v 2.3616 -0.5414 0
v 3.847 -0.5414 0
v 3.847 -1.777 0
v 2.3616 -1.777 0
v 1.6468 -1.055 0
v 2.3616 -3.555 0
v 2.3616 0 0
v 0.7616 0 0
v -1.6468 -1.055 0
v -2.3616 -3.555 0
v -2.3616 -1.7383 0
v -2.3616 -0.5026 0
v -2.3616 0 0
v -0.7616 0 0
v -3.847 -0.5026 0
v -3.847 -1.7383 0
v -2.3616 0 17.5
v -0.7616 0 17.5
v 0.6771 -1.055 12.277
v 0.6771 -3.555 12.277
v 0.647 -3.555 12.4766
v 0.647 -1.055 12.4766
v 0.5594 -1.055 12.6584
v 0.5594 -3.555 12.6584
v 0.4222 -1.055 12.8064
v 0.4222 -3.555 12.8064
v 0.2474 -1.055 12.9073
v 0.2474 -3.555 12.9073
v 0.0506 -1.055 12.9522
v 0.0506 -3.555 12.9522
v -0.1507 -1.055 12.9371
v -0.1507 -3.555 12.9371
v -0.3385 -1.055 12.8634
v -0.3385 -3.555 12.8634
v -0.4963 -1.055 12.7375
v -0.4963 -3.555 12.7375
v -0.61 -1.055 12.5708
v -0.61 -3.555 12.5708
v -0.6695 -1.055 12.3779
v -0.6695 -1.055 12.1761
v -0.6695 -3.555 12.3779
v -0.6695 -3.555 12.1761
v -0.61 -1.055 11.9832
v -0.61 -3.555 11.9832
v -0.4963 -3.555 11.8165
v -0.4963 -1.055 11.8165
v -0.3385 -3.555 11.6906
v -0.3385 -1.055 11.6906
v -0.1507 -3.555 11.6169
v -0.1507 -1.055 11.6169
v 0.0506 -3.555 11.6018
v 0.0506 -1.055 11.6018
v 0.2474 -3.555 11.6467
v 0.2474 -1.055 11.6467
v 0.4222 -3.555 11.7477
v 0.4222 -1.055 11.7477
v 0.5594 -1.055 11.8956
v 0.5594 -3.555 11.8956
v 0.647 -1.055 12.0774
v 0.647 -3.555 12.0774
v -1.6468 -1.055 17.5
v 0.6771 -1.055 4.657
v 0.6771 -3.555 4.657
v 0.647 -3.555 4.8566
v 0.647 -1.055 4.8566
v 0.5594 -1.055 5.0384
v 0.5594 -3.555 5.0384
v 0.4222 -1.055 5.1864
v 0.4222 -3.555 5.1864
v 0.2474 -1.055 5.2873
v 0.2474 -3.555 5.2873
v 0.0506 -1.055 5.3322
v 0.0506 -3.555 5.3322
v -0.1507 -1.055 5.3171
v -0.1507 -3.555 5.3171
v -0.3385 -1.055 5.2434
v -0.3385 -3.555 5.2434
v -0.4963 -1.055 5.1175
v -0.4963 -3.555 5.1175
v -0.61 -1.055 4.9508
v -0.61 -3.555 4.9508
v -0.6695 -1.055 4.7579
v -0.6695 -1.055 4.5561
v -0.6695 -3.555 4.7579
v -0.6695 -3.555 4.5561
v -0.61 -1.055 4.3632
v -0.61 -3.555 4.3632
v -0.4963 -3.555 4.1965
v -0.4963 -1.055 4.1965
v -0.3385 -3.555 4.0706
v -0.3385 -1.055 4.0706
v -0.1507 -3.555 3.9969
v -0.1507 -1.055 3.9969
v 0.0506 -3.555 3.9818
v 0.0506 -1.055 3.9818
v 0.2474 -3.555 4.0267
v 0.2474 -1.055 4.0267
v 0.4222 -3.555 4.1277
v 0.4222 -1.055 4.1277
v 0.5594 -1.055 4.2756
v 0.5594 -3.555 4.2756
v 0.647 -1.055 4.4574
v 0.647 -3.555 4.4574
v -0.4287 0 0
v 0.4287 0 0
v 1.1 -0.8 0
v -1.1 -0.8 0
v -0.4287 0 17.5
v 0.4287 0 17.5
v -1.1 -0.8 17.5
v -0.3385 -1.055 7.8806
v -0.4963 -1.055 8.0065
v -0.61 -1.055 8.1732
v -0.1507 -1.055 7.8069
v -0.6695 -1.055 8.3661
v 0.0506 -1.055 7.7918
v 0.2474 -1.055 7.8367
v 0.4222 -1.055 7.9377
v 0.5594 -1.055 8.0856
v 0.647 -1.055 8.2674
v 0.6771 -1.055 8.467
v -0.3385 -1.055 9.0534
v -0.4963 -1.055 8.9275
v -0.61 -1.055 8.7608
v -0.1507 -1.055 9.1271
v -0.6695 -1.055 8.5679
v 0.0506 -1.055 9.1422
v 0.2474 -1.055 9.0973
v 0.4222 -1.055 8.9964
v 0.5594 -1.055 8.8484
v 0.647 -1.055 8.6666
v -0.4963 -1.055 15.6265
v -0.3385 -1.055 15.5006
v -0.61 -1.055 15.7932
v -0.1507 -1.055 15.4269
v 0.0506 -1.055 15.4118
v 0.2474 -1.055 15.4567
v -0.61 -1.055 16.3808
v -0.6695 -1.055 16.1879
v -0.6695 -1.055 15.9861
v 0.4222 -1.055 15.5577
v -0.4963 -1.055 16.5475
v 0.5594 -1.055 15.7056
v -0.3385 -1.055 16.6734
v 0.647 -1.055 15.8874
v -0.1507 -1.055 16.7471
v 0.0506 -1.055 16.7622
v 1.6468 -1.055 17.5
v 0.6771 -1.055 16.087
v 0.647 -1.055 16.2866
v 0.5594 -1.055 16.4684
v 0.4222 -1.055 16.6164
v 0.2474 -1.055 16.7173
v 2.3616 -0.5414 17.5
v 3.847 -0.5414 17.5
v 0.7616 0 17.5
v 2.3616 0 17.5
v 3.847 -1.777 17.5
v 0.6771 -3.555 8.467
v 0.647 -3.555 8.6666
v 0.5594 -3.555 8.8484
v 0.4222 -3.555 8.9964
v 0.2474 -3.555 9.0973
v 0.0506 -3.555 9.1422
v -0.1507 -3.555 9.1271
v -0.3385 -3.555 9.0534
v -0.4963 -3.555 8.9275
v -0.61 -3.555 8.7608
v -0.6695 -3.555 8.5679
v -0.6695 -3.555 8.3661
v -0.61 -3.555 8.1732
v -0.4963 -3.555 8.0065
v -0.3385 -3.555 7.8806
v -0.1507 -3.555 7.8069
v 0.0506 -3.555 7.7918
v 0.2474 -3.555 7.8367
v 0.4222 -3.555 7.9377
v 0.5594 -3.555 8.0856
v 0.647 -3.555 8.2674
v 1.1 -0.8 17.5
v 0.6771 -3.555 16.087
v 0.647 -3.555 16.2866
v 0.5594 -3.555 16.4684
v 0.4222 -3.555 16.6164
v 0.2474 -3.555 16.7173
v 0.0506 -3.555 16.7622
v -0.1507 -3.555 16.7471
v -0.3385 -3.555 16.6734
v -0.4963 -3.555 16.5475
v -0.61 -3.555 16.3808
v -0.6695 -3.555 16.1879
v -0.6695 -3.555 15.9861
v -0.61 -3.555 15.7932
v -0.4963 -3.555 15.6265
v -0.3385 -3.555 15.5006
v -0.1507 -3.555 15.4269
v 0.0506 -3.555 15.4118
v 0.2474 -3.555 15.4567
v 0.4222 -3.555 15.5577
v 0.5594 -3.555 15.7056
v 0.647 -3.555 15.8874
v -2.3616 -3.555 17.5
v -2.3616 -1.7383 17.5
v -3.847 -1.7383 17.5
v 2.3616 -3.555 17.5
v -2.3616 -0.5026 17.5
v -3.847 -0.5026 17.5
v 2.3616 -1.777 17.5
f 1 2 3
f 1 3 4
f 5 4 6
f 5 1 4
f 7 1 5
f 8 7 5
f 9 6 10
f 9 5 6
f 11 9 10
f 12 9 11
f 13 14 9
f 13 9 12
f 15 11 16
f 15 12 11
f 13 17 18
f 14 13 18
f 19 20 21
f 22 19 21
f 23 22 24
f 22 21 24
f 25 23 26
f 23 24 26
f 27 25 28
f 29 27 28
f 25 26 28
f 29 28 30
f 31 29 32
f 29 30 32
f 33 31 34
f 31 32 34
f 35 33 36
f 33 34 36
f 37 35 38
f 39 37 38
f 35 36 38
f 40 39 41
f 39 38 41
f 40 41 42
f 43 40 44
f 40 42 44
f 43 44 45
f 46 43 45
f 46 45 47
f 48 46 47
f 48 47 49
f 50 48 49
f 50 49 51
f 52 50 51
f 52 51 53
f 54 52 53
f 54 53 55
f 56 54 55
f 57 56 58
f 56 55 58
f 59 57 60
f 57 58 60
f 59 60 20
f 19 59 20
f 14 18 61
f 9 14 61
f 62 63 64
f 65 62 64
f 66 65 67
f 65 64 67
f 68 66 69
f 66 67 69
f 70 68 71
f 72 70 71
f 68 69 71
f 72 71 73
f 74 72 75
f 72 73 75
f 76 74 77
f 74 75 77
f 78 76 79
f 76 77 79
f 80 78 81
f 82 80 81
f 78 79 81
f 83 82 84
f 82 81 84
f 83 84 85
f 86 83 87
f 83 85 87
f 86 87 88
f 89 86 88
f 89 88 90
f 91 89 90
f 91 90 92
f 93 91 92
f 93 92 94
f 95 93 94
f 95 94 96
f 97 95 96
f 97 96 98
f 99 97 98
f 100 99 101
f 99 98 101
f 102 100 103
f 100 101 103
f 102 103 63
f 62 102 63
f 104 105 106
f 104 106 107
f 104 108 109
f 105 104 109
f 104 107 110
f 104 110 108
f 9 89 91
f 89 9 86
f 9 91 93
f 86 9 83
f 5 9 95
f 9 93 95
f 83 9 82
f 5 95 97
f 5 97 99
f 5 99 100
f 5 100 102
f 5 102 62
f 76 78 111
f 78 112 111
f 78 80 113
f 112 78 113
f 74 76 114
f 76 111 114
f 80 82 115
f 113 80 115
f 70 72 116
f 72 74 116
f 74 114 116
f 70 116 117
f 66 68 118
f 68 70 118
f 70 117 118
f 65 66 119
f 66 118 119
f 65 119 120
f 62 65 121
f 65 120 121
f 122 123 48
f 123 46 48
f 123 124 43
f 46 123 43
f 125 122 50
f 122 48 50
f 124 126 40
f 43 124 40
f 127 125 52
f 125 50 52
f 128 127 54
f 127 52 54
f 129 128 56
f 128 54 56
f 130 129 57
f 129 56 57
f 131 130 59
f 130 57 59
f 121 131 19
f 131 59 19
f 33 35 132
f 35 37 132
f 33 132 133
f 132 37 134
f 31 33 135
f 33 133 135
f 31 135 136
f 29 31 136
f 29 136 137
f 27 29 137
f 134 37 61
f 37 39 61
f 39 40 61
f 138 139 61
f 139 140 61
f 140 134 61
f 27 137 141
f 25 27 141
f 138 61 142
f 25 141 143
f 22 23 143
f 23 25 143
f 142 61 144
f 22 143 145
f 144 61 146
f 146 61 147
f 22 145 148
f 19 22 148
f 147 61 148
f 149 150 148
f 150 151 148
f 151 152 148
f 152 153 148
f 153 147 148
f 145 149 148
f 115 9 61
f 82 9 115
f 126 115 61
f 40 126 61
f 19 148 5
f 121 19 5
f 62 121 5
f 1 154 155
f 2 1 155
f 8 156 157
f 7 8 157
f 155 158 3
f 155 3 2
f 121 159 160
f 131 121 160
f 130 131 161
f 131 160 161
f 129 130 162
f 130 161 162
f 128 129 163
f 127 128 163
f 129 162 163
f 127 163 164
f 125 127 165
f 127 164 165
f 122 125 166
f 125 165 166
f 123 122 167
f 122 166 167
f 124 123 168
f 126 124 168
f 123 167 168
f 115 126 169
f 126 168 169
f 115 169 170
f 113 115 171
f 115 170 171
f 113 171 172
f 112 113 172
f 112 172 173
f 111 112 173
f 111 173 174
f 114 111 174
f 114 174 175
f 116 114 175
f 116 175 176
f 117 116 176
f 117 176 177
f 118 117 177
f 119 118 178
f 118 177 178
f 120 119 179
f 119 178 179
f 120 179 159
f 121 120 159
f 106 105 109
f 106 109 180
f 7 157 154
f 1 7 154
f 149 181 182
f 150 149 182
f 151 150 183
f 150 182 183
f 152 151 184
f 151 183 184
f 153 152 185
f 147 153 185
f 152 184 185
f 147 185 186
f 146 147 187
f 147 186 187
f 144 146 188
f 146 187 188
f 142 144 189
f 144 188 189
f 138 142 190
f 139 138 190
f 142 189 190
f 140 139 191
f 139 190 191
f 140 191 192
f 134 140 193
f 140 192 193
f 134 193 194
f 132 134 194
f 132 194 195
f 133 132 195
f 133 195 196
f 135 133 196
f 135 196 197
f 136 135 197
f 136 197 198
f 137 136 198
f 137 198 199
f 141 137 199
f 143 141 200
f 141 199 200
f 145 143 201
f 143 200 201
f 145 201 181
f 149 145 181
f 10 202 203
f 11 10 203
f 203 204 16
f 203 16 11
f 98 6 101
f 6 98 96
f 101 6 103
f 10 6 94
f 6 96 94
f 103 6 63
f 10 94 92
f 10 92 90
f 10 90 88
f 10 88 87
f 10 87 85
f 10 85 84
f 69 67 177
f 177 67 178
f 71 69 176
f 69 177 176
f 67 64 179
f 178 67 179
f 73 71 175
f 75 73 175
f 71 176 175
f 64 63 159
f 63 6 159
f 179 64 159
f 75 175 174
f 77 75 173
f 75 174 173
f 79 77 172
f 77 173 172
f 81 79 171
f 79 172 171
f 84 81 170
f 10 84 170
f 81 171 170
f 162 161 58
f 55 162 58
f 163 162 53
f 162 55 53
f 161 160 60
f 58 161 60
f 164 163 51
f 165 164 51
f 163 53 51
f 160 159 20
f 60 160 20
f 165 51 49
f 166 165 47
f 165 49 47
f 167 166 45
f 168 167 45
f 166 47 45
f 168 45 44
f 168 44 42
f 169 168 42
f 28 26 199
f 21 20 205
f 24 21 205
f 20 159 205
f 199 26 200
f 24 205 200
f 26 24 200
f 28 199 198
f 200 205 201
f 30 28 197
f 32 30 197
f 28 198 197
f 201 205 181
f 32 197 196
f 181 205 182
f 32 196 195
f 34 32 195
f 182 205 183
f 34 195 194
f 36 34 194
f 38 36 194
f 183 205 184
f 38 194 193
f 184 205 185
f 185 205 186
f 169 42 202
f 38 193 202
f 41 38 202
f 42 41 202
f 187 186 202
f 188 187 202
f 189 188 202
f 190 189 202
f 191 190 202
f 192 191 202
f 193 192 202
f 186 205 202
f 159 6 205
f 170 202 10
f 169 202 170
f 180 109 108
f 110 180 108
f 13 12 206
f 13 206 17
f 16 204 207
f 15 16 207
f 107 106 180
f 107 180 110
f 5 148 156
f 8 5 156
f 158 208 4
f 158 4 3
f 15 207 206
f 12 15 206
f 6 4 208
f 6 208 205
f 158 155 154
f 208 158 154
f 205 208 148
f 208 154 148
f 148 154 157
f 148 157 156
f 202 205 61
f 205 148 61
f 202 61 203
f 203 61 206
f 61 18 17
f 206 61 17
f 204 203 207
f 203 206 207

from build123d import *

# Parameters (mm, degrees)
BOSS_EXTRUDE1_DEPTH = 17.5
BOSS_EXTRUDE2_DEPTH = 17.5
SKETCH5_W           = 1.485390476
SKETCH5_H           = 1.235647008
BOSS_EXTRUDE3_DEPTH = 17.5
SKETCH6_R           = 0.677079947
CUT_EXTRUDE1_DEPTH  = 2.50000008


with BuildPart() as part:
    # Sketch1 → Boss-Extrude1 (new body)
    with BuildSketch(Plane.XY):
        Polygon((-0.428720295, 0), (0.428720295, 0), (1.1, -0.8), (-1.1, -0.8), align=None)
    extrude(amount=BOSS_EXTRUDE1_DEPTH)


with BuildPart() as body_2:
    # Sketch4 → Boss-Extrude2 (new body)
    with BuildSketch(Plane.XY.offset(17.5)):
        Polygon((-0.761599151, 0), (-1.64684926, -1.054999998), (1.64684926, -1.054999998), (0.761599151, 0), (2.361595951, 0), (2.361595951, -3.555000078), (-2.361595951, -3.555000078), (-2.361595951, 0), align=None)
    extrude(amount=-BOSS_EXTRUDE2_DEPTH)

    # Sketch5 → Boss-Extrude3 (add)
    with BuildSketch(Plane.XY.offset(17.5)):
        with Locations((-3.104291189, -1.120453231)):
            Rectangle(SKETCH5_W, SKETCH5_H)
        with Locations((3.104291189, -1.159203088)):
            Rectangle(SKETCH5_W, SKETCH5_H)
    extrude(amount=-BOSS_EXTRUDE3_DEPTH)

    # Sketch6 → Cut-Extrude1 (cut)
    with BuildSketch(Plane.XZ.offset(3.555000078)):
        with Locations((0, 16.087014181)):
            Circle(SKETCH6_R)
        with Locations((0, 12.277014181)):
            Circle(SKETCH6_R)
        with Locations((0, 8.467014181)):
            Circle(SKETCH6_R)
        with Locations((0, 4.657014181)):
            Circle(SKETCH6_R)
    extrude(amount=-CUT_EXTRUDE1_DEPTH, mode=Mode.SUBTRACT)


solid = Compound([part.part, body_2.part])
